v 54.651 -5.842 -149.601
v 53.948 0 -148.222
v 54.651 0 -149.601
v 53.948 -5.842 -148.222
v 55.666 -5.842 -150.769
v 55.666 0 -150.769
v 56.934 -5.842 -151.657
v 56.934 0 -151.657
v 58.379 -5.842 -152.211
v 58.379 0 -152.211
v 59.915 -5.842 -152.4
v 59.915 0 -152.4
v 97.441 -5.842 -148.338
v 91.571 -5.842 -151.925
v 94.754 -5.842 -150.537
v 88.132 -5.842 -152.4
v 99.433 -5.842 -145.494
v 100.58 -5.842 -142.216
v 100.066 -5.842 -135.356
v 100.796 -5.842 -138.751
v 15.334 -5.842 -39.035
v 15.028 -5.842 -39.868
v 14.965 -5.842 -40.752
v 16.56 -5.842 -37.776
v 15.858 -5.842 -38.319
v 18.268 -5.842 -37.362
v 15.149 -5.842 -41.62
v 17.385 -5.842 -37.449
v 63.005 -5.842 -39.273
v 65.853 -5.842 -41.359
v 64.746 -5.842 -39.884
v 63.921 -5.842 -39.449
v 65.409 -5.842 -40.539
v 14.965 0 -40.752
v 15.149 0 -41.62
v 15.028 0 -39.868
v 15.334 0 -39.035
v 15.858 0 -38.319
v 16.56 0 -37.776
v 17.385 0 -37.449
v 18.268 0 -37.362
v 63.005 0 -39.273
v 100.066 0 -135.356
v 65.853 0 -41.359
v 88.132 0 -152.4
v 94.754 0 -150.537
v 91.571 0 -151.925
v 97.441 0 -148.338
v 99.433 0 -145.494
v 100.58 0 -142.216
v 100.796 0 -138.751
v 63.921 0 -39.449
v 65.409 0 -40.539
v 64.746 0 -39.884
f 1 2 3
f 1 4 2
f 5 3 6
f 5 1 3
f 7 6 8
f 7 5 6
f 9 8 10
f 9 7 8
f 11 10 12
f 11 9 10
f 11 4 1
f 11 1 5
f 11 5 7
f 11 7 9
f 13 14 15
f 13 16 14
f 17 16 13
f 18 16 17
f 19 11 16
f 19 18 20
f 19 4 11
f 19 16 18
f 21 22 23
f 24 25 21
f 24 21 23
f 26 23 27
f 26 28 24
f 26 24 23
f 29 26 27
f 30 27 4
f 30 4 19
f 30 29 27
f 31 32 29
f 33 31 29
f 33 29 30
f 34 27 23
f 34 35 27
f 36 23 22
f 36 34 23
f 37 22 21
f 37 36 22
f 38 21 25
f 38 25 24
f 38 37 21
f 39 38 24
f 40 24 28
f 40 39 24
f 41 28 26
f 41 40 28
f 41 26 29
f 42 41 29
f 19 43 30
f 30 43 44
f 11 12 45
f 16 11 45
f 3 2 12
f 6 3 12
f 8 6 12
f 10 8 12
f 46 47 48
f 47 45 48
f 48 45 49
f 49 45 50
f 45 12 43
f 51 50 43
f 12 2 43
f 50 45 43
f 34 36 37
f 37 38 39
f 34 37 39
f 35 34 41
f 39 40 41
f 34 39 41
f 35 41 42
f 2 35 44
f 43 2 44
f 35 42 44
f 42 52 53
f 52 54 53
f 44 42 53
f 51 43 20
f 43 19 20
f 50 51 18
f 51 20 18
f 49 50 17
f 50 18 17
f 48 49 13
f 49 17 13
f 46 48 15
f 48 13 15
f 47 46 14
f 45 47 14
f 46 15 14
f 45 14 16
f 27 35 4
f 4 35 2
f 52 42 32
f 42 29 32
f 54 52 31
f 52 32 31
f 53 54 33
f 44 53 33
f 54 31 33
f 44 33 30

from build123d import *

# Parameters (mm, degrees)
F1_DEPTH = 5.842
F2_R     = 6.35
F3_R     = 12.7
F6_DEPTH = 25.4
F7_R     = 3.175


# Not quite as in the source:
# - a length typed as a fraction of an inch, garbled in the dataset ("3 / 203.2 mm" for 3/8 in), is restored


with BuildPart() as f1:
    # F0 (on Front) → F1 (new body)
    with BuildSketch(Plane.XZ):
        Polygon((50.8, 0), (0, 0), (55.4690637022, -152.4), (106.2690637022, -152.4), align=None)
    extrude(amount=F1_DEPTH)

    # F2
    f2_edges = [f1.edges().sort_by_distance(p)[0] for p in [
        (55.469064, -2.921, -152.4),
        (50.8, -2.921, 0),
        (0, -2.921, 0),
    ]]
    fillet(f2_edges, radius=F2_R)

    # F3
    f3_edges = [f1.edges().sort_by_distance(p)[0] for p in [
        (106.269064, -2.921, -152.4),
    ]]
    fillet(f3_edges, radius=F3_R)

    # F5 (on face) → F6 (cut)
    with BuildSketch(Plane.XZ.offset(5.842)):
        Polygon((109.8922565579, 0), (-38.8115942478, 0), (-38.8115942478, -34.925), (109.8922565579, -41.275), align=None)
    extrude(amount=-F6_DEPTH, mode=Mode.SUBTRACT)

    # F7
    f7_edges = [f1.edges().sort_by_distance(p)[0] for p in [
        (65.127115, -2.921, -39.363424),
        (13.525097, -2.921, -37.159898),
    ]]
    fillet(f7_edges, radius=F7_R)


solid = f1.part
